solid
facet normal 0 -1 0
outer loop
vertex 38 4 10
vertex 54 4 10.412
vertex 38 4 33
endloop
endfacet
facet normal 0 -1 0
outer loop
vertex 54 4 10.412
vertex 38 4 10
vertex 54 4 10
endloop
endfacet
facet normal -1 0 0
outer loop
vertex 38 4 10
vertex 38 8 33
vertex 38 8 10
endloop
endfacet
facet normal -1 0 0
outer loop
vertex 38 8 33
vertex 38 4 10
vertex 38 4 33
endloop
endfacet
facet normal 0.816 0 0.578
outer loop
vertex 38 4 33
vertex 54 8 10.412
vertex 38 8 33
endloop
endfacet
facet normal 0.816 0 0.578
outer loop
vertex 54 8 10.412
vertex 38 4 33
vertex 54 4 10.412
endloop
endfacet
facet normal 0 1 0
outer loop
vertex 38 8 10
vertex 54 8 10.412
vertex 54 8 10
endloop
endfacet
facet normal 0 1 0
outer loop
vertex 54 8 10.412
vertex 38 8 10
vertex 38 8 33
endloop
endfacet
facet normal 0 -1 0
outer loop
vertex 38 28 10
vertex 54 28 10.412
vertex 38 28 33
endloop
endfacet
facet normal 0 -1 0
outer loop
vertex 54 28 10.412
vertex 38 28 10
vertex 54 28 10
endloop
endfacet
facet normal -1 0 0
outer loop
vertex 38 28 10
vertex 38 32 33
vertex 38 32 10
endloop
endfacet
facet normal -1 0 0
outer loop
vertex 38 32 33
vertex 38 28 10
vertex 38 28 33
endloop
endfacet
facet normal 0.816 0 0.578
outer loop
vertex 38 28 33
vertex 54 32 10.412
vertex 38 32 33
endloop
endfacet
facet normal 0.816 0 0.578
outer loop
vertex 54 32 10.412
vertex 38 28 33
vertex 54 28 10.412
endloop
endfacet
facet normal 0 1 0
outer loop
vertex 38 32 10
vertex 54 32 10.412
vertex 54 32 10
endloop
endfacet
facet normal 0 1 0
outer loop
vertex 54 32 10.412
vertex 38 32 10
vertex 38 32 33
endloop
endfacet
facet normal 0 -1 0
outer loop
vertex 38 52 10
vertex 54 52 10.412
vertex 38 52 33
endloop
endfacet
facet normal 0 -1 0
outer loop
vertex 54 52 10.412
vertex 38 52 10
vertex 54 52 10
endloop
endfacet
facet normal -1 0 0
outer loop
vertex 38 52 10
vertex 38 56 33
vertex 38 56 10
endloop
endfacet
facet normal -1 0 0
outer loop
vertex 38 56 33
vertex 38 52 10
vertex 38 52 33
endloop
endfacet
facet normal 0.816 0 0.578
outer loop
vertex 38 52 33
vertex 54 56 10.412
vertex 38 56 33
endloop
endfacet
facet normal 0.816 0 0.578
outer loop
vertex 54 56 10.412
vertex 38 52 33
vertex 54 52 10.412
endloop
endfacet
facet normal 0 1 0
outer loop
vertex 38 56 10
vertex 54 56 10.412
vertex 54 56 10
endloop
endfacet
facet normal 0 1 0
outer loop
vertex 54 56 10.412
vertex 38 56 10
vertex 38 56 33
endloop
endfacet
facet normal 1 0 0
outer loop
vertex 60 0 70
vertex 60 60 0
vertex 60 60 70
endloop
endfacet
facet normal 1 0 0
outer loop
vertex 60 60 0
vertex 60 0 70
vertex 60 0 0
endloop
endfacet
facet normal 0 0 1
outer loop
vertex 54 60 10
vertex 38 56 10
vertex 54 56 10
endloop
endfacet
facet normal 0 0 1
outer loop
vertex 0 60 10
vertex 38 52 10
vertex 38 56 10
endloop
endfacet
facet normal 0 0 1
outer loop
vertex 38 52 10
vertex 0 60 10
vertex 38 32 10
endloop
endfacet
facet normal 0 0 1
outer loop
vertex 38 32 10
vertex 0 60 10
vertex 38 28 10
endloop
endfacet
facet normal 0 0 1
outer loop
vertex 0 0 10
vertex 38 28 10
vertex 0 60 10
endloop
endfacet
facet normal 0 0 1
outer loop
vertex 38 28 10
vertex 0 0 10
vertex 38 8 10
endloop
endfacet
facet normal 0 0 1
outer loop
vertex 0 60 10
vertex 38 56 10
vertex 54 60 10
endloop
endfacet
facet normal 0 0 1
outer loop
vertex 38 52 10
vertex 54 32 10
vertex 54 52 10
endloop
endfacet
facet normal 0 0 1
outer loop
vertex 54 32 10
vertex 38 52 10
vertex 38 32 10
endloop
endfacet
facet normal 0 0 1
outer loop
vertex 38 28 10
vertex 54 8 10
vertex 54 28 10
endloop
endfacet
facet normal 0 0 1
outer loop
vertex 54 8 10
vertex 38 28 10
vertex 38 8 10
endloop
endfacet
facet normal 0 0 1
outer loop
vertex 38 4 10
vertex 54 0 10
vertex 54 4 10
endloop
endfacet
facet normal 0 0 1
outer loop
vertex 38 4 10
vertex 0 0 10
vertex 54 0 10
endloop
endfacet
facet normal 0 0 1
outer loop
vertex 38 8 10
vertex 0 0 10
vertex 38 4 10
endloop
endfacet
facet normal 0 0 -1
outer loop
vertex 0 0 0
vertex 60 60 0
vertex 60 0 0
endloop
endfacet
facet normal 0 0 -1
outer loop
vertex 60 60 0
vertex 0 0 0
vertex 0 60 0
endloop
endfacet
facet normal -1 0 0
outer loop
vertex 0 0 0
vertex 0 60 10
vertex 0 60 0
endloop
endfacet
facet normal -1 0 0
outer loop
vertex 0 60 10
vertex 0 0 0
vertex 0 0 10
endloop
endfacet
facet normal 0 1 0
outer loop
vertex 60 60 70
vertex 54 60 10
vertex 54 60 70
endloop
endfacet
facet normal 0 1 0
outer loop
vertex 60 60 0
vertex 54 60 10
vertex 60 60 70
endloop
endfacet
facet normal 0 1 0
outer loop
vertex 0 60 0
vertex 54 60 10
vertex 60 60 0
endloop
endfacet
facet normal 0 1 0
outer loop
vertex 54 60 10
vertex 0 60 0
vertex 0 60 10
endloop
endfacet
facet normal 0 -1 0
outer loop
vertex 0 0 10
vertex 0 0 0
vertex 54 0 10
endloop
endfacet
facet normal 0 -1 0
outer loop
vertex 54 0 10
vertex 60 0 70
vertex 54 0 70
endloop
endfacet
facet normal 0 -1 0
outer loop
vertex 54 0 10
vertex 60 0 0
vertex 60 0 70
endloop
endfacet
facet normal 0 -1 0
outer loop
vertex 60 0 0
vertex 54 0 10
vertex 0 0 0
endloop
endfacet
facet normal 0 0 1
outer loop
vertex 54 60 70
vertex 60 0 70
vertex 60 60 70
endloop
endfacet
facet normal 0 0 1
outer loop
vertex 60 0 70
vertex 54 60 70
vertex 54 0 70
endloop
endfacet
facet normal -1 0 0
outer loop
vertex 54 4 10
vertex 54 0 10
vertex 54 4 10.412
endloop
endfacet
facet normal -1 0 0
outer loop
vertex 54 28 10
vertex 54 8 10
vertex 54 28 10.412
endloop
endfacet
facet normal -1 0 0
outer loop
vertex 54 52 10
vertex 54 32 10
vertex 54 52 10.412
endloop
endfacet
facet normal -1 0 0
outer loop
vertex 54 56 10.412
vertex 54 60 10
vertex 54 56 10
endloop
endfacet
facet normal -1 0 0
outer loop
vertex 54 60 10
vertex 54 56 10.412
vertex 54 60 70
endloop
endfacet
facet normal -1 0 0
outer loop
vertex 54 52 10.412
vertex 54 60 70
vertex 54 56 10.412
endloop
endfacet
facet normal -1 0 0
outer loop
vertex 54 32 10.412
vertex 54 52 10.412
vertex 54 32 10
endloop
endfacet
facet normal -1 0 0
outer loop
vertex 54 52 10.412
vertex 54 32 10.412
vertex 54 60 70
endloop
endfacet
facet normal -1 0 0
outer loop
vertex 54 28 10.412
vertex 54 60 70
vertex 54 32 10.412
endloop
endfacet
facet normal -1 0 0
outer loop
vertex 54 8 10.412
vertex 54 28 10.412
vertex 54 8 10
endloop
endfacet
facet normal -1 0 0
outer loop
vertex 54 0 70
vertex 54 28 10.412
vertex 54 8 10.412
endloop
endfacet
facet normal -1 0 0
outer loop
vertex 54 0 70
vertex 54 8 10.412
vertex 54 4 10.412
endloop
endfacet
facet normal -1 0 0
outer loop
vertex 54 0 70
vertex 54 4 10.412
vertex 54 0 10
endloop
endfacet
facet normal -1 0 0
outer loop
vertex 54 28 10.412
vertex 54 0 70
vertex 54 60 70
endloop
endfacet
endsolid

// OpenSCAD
$fn = 32;

// ----------------------------------------------------------------------
// Rib bracket: 3-gusset L bracket
// ----------------------------------------------------------------------

// --- parameters (mm) ---
base_l = 60;              // foot length, X
base_w = 60;              // foot width, Y
base_t = 10;              // foot thickness
plate_t = 6;              // upright plate thickness
plate_h = 70;             // overall height
gus_l = 16;               // gusset leg along the foot
gus_h = 24;               // gusset height
gus_t = 4;                // gusset thickness
gus_edge = 4;             // gusset margin from the foot edge
n_gus = 3;                // gusset count
fit_tol = 0.05;           // tolerance for press fits, mm
free_tol = 0.2;           // tolerance for clearance fits, mm

gus_pitch = (base_w - 2 * gus_edge - gus_t) / (n_gus - 1);  // gusset pitch

union() {
  cube([base_l, base_w, base_t]);
  translate([base_l - plate_t, 0, base_t - 1])
    cube([plate_t, base_w, plate_h - base_t + 1]);
  for (i = [0 : n_gus - 1])
    translate([base_l - plate_t - gus_l, gus_edge + i * gus_pitch, base_t - 1])
      rotate([-90, 0, 0])
        linear_extrude(height = gus_t)
          polygon(points = [[0, 0], [gus_l + 1, 0], [0, -gus_h]]);
}
